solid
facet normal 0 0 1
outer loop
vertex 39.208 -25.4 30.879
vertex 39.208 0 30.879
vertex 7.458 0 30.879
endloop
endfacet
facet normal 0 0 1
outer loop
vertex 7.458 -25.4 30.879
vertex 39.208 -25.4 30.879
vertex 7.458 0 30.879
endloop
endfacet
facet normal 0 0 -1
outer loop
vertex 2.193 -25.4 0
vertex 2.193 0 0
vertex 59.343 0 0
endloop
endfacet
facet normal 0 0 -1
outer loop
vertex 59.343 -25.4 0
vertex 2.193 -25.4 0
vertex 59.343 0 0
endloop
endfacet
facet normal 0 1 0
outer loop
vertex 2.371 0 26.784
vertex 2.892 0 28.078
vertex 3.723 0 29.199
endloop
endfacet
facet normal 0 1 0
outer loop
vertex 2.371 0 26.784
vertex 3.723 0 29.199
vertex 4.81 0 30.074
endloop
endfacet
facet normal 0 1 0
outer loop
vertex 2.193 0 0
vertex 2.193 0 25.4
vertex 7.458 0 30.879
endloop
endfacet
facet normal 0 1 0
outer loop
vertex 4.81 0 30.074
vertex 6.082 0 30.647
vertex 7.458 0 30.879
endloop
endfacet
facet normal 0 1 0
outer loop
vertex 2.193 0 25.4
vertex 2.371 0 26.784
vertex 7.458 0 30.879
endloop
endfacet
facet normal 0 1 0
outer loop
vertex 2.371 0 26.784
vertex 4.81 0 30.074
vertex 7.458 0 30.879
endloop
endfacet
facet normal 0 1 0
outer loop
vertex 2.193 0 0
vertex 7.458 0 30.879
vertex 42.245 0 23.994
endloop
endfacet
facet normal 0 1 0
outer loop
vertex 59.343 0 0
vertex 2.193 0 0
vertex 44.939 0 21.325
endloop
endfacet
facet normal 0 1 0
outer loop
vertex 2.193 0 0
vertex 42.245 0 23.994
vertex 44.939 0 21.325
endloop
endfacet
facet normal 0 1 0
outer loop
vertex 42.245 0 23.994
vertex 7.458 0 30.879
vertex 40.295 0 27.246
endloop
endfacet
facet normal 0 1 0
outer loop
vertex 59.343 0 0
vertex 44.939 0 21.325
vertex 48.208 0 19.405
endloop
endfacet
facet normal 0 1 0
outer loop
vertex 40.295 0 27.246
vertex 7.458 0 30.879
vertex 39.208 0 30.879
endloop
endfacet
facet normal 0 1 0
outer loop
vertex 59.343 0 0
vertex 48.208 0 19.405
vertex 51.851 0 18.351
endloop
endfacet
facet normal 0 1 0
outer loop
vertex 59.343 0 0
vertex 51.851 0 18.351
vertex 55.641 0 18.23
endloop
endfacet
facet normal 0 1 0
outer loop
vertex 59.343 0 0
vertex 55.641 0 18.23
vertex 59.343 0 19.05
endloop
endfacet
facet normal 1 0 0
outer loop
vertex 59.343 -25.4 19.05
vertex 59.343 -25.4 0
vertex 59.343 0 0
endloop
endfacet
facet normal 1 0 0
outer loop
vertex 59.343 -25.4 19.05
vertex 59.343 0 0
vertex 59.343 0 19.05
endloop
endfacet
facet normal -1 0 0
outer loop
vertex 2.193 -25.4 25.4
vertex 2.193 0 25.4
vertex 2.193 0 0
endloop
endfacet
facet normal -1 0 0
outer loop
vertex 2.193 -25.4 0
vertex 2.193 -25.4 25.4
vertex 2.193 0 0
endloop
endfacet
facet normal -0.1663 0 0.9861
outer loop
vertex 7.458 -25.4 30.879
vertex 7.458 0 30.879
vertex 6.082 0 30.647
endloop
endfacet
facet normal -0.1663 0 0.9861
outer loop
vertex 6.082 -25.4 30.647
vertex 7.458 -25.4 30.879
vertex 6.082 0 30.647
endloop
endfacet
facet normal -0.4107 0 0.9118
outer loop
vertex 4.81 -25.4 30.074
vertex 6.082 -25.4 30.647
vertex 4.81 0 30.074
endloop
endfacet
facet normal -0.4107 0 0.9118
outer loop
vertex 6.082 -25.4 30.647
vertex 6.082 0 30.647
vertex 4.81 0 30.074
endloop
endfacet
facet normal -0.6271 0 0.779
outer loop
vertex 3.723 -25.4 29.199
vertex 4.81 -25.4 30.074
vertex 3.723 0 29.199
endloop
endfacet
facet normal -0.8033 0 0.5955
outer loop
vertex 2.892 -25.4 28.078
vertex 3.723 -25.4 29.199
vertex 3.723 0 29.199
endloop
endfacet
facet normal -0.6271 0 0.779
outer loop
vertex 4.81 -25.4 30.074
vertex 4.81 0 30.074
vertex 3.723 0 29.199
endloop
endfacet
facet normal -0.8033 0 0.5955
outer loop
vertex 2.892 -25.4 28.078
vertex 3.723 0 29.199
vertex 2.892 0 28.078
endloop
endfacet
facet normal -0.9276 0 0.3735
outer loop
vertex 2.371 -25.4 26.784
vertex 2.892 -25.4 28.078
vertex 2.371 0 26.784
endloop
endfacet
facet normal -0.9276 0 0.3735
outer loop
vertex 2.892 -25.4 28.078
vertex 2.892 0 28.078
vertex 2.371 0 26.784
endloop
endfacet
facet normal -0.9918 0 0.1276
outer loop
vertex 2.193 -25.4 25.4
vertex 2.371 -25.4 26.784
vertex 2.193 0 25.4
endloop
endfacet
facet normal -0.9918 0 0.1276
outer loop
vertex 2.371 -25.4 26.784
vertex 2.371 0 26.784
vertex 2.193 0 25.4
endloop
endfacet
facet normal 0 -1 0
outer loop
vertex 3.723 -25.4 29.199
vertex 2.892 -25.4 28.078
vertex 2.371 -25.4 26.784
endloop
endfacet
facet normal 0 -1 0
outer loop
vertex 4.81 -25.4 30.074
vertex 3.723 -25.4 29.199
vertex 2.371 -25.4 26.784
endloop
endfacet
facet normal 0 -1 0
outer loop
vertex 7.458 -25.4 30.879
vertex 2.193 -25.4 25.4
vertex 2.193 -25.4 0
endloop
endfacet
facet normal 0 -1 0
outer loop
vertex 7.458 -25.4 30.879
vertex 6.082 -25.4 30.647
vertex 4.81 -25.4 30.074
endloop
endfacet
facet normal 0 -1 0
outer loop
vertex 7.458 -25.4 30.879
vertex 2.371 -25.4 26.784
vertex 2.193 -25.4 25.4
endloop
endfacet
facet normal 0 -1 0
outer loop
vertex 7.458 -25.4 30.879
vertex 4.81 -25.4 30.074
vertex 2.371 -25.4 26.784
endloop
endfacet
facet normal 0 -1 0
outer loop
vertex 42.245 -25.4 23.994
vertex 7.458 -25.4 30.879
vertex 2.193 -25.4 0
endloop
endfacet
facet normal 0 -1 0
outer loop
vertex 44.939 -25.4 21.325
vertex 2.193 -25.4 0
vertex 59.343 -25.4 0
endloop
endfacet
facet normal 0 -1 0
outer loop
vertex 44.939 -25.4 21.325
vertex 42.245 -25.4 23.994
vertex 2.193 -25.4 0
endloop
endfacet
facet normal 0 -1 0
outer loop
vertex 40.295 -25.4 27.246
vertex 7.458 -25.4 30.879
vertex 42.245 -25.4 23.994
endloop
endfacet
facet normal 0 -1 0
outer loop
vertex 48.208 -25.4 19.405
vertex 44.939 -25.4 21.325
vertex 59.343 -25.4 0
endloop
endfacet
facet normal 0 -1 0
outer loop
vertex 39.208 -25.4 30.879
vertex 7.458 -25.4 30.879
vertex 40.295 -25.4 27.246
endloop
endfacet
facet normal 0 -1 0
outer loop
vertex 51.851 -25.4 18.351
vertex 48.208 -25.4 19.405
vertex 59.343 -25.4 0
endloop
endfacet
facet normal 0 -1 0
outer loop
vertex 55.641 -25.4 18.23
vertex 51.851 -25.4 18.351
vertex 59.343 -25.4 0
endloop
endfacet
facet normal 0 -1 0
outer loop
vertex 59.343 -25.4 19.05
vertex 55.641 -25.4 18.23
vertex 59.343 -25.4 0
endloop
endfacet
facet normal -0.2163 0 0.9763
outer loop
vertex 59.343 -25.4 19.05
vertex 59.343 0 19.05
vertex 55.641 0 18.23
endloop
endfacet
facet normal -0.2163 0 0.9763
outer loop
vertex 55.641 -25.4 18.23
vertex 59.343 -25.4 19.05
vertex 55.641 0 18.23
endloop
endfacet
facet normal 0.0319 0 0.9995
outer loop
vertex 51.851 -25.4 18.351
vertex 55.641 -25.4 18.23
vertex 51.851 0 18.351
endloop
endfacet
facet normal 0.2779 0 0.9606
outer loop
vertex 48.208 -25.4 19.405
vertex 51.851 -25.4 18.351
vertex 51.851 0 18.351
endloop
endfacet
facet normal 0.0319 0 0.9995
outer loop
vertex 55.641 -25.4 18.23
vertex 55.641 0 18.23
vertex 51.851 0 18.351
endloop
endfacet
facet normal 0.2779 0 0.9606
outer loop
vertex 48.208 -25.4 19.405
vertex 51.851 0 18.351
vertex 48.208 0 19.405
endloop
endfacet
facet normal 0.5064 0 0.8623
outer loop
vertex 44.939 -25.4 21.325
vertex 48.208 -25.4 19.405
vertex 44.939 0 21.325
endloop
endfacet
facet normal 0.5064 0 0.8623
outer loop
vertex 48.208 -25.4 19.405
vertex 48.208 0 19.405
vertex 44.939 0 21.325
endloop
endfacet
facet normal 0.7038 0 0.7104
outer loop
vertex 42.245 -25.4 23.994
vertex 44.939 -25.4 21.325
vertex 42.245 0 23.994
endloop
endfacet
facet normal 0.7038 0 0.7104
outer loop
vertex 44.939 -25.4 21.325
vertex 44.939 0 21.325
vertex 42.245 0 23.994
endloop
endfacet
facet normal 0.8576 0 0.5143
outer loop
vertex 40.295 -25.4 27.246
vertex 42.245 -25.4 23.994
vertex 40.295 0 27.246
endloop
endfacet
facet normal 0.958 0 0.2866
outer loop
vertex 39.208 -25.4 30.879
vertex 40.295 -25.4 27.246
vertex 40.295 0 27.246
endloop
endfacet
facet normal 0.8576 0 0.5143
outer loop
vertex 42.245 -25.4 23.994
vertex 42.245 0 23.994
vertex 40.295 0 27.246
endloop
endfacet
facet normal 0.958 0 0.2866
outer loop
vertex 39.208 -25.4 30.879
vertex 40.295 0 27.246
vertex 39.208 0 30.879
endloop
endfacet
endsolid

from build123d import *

# Parameters (mm, degrees)
F1_DEPTH = 25.4


with BuildPart() as f1:
    # F0 (on Front) → F1 (new body)
    with BuildSketch(Plane.XZ):
        with BuildLine():
            Line((2.19345, 25.4), (2.19345, 0))
            Line((2.19345, 0), (59.34345, 0))
            Line((59.34345, 0), (59.34345, 19.05))
            ThreePointArc((59.34345, 19.05), (46.513424, 20.262757), (39.207902, 30.87924))
            Line((39.207902, 30.87924), (7.457902, 30.87924))
            ThreePointArc((7.457902, 30.87924), (3.722837, 29.199227), (2.19345, 25.4))
        make_face()
    extrude(amount=F1_DEPTH)


solid = f1.part
